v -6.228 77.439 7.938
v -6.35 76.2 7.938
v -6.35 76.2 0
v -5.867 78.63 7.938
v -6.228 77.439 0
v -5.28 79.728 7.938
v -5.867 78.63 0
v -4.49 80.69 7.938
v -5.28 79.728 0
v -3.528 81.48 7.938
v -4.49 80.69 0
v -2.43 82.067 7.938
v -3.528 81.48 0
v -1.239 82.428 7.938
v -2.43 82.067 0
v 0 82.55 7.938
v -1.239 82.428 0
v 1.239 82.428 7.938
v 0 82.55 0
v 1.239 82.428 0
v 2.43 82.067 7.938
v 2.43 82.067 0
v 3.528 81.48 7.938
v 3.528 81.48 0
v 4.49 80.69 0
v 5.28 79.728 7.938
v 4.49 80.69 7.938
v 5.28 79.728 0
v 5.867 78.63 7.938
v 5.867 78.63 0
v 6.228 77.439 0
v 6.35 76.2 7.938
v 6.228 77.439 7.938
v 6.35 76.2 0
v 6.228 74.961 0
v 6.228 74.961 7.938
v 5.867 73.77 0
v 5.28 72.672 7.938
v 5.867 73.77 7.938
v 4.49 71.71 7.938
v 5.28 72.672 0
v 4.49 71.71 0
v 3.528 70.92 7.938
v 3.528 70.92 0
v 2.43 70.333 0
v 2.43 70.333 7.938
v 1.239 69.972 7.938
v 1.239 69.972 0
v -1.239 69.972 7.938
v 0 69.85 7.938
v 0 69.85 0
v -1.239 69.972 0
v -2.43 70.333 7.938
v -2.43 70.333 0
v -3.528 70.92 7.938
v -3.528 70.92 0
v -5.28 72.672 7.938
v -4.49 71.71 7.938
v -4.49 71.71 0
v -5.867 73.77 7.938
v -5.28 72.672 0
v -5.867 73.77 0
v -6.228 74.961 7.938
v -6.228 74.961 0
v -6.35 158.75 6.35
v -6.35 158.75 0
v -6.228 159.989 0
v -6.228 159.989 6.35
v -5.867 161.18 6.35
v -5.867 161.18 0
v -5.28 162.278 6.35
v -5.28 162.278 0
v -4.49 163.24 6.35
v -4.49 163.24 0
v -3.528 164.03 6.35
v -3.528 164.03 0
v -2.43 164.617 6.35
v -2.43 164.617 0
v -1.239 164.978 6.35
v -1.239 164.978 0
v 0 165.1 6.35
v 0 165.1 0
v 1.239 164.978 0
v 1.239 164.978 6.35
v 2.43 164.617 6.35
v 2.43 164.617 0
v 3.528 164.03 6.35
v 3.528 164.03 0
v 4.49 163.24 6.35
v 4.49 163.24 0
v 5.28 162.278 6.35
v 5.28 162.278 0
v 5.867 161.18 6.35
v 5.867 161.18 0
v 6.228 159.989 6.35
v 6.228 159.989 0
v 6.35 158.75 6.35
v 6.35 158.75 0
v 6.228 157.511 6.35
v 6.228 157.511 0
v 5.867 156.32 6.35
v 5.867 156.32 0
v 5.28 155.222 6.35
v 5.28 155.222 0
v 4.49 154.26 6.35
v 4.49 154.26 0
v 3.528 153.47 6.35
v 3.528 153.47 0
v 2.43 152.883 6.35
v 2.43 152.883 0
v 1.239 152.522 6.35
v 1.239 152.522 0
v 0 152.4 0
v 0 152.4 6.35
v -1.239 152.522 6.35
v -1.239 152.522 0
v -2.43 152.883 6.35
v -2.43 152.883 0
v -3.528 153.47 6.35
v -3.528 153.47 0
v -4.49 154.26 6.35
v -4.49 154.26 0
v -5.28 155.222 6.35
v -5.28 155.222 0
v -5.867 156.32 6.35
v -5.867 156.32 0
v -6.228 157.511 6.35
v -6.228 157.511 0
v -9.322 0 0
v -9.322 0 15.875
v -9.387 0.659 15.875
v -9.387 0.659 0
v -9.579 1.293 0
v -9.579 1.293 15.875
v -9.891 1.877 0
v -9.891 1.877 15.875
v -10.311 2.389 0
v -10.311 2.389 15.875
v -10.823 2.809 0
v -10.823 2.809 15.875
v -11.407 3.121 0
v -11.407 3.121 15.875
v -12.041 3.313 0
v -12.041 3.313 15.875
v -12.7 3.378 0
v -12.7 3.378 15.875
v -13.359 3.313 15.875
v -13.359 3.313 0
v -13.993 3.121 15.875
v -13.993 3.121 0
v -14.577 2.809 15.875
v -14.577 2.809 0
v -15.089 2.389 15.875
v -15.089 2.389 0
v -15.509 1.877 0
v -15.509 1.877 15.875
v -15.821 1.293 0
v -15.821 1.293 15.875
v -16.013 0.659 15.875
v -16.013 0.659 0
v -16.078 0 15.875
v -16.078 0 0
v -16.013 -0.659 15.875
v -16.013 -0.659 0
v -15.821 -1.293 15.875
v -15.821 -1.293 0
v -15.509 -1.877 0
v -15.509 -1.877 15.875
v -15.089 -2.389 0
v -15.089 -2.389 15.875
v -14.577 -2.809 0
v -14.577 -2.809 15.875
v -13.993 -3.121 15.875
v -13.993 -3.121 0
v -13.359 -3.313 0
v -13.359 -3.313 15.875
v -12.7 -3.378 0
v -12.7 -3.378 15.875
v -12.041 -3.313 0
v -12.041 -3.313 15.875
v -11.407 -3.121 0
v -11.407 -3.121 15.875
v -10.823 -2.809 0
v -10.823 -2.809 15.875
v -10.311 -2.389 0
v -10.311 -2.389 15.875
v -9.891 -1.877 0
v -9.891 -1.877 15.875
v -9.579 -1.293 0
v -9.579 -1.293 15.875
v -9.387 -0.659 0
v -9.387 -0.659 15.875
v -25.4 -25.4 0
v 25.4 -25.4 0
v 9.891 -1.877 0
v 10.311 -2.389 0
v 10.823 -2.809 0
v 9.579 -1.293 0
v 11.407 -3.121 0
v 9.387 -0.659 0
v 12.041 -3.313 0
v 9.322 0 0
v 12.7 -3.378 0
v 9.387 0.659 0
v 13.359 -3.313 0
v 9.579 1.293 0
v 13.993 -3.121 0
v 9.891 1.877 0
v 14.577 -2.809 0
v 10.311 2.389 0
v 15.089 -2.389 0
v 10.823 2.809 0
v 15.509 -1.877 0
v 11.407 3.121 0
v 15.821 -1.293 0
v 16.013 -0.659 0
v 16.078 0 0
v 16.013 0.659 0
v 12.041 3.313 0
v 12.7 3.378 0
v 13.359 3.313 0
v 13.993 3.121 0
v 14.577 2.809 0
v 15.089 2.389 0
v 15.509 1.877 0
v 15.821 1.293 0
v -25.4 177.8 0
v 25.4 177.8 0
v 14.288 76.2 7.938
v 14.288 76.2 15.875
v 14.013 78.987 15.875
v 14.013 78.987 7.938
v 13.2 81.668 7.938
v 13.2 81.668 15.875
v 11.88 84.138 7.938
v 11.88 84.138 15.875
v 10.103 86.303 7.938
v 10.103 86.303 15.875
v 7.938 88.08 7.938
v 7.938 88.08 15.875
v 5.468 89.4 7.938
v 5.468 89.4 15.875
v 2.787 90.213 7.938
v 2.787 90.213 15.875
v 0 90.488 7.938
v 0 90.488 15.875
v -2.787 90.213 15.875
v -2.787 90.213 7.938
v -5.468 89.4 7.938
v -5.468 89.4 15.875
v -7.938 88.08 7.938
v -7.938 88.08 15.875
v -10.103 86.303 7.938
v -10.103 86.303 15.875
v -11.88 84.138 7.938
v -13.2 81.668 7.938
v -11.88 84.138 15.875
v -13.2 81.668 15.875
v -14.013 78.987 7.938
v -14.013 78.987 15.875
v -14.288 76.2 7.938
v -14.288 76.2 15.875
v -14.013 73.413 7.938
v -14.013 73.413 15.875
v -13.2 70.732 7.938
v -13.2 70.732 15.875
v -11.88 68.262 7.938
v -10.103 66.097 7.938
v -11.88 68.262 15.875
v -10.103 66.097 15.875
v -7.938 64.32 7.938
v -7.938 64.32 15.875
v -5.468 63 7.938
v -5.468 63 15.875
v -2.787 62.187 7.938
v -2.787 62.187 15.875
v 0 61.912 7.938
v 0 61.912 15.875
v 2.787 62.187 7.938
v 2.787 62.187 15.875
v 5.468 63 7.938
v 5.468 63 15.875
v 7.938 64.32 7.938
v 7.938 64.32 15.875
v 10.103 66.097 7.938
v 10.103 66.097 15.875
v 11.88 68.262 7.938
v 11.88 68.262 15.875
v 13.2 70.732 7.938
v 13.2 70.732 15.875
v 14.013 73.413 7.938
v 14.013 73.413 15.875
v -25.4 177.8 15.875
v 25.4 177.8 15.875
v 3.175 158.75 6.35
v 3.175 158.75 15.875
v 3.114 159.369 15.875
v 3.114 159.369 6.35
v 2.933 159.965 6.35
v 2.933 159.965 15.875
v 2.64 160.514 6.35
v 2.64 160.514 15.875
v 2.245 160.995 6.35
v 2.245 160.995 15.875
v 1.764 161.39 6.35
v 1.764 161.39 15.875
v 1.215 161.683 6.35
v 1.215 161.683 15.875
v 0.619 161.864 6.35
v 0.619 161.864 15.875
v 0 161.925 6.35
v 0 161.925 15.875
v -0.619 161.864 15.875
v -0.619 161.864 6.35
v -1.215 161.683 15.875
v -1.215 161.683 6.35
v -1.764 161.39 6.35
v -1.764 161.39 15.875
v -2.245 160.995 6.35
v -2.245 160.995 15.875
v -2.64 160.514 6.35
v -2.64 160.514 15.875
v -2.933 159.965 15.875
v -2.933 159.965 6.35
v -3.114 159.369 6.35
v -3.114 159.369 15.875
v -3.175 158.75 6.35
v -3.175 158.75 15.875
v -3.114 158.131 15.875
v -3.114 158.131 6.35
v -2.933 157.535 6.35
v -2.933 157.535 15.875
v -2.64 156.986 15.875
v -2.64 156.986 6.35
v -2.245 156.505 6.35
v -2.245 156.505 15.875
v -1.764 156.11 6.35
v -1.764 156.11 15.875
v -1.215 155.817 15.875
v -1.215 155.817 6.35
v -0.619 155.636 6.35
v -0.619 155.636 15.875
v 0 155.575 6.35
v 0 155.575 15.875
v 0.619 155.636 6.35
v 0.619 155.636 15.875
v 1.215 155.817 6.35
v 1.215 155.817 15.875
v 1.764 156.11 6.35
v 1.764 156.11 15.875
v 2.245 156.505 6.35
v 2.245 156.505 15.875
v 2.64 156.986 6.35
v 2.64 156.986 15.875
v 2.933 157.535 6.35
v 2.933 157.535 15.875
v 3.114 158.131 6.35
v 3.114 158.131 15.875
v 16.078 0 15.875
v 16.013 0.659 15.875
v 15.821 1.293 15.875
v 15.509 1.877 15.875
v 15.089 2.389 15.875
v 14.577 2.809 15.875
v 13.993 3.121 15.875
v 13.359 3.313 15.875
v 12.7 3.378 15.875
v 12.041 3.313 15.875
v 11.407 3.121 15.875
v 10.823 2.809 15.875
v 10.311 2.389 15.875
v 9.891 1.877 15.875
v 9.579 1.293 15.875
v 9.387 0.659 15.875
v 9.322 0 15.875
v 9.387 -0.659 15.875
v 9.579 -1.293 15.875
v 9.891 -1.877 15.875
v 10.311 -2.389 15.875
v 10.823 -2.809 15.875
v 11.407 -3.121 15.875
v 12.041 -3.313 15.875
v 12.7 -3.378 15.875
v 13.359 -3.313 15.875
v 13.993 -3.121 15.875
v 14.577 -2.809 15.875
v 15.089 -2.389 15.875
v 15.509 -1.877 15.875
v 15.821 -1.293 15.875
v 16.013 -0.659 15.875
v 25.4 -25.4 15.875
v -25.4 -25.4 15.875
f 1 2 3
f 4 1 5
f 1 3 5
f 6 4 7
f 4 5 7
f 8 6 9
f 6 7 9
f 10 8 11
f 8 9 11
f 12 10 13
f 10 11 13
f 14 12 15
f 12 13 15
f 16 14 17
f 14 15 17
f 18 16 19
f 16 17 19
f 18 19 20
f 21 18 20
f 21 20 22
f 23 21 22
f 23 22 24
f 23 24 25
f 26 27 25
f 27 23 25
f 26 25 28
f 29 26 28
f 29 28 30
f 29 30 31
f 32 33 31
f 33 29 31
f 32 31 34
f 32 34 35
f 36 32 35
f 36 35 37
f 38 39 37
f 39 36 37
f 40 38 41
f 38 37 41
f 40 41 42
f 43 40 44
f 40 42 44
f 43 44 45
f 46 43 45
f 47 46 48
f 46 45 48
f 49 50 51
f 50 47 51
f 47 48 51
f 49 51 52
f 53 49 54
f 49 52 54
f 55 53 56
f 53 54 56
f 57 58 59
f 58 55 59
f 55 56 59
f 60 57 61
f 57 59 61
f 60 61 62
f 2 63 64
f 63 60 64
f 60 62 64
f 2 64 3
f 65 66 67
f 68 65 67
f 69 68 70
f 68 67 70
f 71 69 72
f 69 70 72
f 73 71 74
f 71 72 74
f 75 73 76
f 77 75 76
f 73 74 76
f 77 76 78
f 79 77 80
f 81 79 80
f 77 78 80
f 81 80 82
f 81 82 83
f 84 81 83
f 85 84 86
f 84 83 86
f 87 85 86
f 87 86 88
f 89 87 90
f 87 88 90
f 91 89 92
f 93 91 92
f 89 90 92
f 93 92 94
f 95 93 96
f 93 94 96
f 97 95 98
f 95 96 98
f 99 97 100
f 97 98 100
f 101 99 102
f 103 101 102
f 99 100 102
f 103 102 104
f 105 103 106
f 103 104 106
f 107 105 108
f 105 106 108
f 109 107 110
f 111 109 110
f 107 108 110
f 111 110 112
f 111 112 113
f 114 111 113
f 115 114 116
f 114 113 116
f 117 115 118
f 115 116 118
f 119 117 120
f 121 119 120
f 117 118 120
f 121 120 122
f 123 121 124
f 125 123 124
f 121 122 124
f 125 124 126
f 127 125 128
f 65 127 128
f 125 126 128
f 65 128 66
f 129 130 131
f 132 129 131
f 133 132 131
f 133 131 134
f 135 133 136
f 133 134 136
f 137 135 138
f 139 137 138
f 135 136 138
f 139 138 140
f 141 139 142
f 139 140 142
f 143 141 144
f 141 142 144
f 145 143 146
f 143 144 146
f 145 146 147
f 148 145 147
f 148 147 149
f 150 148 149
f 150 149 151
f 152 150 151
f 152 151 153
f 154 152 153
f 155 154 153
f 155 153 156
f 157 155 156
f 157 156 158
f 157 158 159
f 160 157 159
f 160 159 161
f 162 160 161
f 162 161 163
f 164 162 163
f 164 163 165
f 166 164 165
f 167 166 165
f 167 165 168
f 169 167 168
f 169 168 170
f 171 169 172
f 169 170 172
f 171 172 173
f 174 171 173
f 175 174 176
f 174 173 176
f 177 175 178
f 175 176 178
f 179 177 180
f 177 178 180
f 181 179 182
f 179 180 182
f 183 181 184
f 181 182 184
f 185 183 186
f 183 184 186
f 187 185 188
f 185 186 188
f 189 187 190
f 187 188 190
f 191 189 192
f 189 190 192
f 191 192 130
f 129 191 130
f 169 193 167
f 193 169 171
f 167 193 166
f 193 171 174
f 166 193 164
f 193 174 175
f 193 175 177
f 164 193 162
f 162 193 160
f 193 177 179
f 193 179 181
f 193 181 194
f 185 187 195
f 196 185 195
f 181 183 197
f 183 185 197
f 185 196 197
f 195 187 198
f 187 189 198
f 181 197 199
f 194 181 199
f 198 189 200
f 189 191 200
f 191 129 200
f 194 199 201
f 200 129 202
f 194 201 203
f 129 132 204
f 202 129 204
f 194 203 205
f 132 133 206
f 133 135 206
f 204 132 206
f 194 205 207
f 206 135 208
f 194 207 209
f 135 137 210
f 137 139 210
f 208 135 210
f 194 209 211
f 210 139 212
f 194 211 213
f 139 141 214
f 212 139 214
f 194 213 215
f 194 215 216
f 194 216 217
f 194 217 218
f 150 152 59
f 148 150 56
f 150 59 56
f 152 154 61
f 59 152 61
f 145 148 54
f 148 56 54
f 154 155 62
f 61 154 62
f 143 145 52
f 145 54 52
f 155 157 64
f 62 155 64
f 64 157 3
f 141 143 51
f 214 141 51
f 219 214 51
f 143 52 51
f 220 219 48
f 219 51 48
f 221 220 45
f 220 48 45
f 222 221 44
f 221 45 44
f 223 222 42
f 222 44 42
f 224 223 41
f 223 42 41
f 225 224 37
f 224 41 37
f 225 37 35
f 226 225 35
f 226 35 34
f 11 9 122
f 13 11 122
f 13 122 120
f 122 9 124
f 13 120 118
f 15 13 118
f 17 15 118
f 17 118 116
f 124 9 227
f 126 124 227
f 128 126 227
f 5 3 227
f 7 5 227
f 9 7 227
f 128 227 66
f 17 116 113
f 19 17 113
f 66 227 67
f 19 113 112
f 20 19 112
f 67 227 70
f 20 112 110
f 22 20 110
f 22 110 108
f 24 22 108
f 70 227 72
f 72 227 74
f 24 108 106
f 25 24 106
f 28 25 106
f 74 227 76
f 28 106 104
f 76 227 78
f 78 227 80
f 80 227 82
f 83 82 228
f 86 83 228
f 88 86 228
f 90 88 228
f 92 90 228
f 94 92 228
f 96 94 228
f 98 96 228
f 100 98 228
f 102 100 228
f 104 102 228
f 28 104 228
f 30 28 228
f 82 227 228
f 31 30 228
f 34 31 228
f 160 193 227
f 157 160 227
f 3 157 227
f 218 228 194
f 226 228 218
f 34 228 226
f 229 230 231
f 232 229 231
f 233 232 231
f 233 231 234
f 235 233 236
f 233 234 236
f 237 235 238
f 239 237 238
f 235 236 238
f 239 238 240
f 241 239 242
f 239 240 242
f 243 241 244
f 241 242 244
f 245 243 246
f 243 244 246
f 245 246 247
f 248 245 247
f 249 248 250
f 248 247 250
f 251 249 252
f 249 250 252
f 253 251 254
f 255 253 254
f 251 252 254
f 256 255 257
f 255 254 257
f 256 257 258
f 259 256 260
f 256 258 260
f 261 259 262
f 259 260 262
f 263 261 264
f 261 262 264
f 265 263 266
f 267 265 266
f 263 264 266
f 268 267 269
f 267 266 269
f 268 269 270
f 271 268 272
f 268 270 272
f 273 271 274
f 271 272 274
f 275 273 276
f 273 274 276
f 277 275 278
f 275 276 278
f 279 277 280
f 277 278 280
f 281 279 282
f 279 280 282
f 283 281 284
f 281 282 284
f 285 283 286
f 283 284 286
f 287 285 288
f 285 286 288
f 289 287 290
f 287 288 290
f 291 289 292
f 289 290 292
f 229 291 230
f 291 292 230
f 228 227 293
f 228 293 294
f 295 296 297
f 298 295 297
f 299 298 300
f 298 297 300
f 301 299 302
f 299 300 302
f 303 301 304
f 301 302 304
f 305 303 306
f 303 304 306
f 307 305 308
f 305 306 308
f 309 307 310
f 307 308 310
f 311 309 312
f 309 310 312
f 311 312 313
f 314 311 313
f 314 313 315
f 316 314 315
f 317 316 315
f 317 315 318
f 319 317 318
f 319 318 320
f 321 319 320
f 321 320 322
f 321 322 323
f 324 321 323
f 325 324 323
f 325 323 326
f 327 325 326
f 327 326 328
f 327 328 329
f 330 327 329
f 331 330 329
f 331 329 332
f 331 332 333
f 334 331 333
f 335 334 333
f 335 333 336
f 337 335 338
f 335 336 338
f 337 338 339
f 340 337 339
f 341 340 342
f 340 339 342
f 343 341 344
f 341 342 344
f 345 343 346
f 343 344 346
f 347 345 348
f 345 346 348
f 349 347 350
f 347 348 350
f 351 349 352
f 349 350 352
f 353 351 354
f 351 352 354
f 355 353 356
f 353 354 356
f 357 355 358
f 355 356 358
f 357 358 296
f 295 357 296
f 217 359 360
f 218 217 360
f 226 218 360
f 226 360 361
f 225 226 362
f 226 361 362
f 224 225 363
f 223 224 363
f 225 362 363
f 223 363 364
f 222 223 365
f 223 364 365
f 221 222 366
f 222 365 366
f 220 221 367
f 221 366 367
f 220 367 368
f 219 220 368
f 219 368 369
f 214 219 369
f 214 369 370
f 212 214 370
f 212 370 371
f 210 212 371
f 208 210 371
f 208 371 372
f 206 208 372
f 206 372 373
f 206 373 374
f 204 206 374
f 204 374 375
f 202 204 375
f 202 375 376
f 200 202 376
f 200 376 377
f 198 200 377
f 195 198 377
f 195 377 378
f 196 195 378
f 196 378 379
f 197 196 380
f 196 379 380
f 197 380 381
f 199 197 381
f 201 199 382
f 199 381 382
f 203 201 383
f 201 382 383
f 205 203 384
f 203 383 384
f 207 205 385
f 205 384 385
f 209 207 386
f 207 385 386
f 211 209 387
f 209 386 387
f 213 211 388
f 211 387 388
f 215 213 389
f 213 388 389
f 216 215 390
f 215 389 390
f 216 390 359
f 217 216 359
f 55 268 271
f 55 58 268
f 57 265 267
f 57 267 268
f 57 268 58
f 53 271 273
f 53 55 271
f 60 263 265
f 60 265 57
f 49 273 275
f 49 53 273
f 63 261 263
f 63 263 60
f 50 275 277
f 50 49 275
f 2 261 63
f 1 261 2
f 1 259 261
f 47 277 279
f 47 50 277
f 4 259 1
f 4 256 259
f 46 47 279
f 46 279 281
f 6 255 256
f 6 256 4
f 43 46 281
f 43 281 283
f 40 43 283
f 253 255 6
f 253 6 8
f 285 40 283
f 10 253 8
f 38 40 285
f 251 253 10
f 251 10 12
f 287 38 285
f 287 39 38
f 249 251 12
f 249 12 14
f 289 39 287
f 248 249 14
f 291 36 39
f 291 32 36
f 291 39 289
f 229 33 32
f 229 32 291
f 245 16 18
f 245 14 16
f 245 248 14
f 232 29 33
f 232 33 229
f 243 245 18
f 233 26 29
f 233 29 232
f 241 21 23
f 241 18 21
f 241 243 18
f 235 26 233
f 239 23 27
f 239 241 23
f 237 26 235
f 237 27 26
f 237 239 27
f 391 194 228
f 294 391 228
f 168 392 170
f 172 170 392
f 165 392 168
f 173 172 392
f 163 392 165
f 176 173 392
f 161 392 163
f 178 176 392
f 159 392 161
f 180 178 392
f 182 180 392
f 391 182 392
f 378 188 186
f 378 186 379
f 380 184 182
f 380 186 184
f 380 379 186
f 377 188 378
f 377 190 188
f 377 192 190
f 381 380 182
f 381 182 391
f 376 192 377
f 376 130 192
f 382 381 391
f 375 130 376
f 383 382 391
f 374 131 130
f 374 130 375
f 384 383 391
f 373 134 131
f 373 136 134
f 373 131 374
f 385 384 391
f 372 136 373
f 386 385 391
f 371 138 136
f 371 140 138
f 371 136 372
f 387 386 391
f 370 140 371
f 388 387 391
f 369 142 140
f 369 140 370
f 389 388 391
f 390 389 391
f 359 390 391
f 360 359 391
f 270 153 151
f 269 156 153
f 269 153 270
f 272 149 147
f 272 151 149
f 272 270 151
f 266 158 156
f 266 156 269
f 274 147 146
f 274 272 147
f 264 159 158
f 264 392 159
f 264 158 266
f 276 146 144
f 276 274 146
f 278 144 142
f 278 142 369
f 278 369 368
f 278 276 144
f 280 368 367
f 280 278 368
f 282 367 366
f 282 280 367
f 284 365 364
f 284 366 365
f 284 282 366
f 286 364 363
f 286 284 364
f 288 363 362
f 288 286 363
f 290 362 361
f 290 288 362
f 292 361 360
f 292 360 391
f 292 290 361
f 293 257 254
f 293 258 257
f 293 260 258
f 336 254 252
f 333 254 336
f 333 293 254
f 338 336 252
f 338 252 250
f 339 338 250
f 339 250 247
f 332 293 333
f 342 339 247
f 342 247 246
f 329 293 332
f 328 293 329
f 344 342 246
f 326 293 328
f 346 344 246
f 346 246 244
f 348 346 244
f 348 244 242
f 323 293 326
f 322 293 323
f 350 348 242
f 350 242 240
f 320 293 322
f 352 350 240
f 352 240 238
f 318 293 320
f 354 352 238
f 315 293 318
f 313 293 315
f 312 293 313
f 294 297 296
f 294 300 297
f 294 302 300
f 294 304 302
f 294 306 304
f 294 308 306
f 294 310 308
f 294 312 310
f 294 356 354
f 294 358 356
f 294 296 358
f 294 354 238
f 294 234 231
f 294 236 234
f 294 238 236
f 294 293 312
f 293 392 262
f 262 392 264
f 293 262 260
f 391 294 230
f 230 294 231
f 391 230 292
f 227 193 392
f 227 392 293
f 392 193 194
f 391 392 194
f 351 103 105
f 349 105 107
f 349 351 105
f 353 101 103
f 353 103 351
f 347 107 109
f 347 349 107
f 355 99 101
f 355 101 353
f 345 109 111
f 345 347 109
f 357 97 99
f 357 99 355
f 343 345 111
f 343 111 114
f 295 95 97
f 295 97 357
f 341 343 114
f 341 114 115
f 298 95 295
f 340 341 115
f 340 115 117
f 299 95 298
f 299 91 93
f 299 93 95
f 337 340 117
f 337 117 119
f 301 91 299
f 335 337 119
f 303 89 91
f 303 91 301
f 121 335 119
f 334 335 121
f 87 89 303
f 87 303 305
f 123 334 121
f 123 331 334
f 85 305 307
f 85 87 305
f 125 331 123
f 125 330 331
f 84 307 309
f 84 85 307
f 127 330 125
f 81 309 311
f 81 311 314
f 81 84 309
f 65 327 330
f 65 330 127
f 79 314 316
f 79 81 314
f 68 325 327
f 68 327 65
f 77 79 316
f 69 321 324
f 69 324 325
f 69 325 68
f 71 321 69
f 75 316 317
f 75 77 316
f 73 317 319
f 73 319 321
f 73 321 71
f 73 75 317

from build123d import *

# Parameters (mm, degrees)
SKETCH1_W                   = 50.8
SKETCH1_H                   = 203.2
BOSS_EXTRUDE1_DEPTH         = 15.875
SKETCH2_R                   = 3.3782
CUT_EXTRUDE1_DEPTH          = 181.305339979
SKETCH5_R                   = 6.35
CUT_EXTRUDE2_DEPTH          = 6.35
F_1_4_0_25_DIAMETER_HOLE1_D = 6.35
SKETCH5_3_R                 = 6.35
CUT_EXTRUDE3_DEPTH          = 181.305339979
CUT_EXTRUDE4_START          = -7.9375
SKETCH10_R                  = 14.2875
SKETCH10_R_2                = 6.35
CUT_EXTRUDE4_DEPTH          = 7.9375


with BuildPart() as part:
    # Sketch1 → Boss-Extrude1 (new body)
    with BuildSketch(Plane.XY):
        with Locations((0, 76.2)):
            Rectangle(SKETCH1_W, SKETCH1_H)
    extrude(amount=BOSS_EXTRUDE1_DEPTH)

    # Sketch2 → Cut-Extrude1 (cut, through all)
    with BuildSketch(Plane.XY.offset(15.875)):
        with Locations((-12.7, 0)):
            Circle(SKETCH2_R)
        with Locations((12.7, 0)):
            Circle(SKETCH2_R)
    extrude(amount=-CUT_EXTRUDE1_DEPTH, mode=Mode.SUBTRACT)

    # Sketch5 → Cut-Extrude2 (cut)
    with BuildSketch(Plane(origin=(0, 0, 0), x_dir=(-1, 0, 0), z_dir=(0, 0, -1))):
        with Locations((0, 158.75)):
            Circle(SKETCH5_R)
    extrude(amount=-CUT_EXTRUDE2_DEPTH, mode=Mode.SUBTRACT)

    # 1/4 (0.25) Diameter Hole1 (through all)
    with Locations(Plane(origin=(0, 0, 6.35), x_dir=(-1, 0, 0), z_dir=(0, 0, -1))):
        with Locations((0, 158.75)):
            Hole(F_1_4_0_25_DIAMETER_HOLE1_D / 2)

    # Sketch5<3> → Cut-Extrude3 (cut, through all)
    with BuildSketch(Plane(origin=(0, 0, 0), x_dir=(-1, 0, 0), z_dir=(0, 0, -1))):
        with Locations((0, 76.2)):
            Circle(SKETCH5_3_R)
    extrude(amount=-CUT_EXTRUDE3_DEPTH, mode=Mode.SUBTRACT)

    # Sketch10 → Cut-Extrude4 (cut)
    with BuildSketch(Plane.XY.offset(15.875).offset(CUT_EXTRUDE4_START)):
        with Locations((0, 76.2)):
            Circle(SKETCH10_R)
        with Locations((0, 76.2)):
            Circle(SKETCH10_R_2, mode=Mode.SUBTRACT)
    extrude(amount=CUT_EXTRUDE4_DEPTH, mode=Mode.SUBTRACT)


solid = part.part
